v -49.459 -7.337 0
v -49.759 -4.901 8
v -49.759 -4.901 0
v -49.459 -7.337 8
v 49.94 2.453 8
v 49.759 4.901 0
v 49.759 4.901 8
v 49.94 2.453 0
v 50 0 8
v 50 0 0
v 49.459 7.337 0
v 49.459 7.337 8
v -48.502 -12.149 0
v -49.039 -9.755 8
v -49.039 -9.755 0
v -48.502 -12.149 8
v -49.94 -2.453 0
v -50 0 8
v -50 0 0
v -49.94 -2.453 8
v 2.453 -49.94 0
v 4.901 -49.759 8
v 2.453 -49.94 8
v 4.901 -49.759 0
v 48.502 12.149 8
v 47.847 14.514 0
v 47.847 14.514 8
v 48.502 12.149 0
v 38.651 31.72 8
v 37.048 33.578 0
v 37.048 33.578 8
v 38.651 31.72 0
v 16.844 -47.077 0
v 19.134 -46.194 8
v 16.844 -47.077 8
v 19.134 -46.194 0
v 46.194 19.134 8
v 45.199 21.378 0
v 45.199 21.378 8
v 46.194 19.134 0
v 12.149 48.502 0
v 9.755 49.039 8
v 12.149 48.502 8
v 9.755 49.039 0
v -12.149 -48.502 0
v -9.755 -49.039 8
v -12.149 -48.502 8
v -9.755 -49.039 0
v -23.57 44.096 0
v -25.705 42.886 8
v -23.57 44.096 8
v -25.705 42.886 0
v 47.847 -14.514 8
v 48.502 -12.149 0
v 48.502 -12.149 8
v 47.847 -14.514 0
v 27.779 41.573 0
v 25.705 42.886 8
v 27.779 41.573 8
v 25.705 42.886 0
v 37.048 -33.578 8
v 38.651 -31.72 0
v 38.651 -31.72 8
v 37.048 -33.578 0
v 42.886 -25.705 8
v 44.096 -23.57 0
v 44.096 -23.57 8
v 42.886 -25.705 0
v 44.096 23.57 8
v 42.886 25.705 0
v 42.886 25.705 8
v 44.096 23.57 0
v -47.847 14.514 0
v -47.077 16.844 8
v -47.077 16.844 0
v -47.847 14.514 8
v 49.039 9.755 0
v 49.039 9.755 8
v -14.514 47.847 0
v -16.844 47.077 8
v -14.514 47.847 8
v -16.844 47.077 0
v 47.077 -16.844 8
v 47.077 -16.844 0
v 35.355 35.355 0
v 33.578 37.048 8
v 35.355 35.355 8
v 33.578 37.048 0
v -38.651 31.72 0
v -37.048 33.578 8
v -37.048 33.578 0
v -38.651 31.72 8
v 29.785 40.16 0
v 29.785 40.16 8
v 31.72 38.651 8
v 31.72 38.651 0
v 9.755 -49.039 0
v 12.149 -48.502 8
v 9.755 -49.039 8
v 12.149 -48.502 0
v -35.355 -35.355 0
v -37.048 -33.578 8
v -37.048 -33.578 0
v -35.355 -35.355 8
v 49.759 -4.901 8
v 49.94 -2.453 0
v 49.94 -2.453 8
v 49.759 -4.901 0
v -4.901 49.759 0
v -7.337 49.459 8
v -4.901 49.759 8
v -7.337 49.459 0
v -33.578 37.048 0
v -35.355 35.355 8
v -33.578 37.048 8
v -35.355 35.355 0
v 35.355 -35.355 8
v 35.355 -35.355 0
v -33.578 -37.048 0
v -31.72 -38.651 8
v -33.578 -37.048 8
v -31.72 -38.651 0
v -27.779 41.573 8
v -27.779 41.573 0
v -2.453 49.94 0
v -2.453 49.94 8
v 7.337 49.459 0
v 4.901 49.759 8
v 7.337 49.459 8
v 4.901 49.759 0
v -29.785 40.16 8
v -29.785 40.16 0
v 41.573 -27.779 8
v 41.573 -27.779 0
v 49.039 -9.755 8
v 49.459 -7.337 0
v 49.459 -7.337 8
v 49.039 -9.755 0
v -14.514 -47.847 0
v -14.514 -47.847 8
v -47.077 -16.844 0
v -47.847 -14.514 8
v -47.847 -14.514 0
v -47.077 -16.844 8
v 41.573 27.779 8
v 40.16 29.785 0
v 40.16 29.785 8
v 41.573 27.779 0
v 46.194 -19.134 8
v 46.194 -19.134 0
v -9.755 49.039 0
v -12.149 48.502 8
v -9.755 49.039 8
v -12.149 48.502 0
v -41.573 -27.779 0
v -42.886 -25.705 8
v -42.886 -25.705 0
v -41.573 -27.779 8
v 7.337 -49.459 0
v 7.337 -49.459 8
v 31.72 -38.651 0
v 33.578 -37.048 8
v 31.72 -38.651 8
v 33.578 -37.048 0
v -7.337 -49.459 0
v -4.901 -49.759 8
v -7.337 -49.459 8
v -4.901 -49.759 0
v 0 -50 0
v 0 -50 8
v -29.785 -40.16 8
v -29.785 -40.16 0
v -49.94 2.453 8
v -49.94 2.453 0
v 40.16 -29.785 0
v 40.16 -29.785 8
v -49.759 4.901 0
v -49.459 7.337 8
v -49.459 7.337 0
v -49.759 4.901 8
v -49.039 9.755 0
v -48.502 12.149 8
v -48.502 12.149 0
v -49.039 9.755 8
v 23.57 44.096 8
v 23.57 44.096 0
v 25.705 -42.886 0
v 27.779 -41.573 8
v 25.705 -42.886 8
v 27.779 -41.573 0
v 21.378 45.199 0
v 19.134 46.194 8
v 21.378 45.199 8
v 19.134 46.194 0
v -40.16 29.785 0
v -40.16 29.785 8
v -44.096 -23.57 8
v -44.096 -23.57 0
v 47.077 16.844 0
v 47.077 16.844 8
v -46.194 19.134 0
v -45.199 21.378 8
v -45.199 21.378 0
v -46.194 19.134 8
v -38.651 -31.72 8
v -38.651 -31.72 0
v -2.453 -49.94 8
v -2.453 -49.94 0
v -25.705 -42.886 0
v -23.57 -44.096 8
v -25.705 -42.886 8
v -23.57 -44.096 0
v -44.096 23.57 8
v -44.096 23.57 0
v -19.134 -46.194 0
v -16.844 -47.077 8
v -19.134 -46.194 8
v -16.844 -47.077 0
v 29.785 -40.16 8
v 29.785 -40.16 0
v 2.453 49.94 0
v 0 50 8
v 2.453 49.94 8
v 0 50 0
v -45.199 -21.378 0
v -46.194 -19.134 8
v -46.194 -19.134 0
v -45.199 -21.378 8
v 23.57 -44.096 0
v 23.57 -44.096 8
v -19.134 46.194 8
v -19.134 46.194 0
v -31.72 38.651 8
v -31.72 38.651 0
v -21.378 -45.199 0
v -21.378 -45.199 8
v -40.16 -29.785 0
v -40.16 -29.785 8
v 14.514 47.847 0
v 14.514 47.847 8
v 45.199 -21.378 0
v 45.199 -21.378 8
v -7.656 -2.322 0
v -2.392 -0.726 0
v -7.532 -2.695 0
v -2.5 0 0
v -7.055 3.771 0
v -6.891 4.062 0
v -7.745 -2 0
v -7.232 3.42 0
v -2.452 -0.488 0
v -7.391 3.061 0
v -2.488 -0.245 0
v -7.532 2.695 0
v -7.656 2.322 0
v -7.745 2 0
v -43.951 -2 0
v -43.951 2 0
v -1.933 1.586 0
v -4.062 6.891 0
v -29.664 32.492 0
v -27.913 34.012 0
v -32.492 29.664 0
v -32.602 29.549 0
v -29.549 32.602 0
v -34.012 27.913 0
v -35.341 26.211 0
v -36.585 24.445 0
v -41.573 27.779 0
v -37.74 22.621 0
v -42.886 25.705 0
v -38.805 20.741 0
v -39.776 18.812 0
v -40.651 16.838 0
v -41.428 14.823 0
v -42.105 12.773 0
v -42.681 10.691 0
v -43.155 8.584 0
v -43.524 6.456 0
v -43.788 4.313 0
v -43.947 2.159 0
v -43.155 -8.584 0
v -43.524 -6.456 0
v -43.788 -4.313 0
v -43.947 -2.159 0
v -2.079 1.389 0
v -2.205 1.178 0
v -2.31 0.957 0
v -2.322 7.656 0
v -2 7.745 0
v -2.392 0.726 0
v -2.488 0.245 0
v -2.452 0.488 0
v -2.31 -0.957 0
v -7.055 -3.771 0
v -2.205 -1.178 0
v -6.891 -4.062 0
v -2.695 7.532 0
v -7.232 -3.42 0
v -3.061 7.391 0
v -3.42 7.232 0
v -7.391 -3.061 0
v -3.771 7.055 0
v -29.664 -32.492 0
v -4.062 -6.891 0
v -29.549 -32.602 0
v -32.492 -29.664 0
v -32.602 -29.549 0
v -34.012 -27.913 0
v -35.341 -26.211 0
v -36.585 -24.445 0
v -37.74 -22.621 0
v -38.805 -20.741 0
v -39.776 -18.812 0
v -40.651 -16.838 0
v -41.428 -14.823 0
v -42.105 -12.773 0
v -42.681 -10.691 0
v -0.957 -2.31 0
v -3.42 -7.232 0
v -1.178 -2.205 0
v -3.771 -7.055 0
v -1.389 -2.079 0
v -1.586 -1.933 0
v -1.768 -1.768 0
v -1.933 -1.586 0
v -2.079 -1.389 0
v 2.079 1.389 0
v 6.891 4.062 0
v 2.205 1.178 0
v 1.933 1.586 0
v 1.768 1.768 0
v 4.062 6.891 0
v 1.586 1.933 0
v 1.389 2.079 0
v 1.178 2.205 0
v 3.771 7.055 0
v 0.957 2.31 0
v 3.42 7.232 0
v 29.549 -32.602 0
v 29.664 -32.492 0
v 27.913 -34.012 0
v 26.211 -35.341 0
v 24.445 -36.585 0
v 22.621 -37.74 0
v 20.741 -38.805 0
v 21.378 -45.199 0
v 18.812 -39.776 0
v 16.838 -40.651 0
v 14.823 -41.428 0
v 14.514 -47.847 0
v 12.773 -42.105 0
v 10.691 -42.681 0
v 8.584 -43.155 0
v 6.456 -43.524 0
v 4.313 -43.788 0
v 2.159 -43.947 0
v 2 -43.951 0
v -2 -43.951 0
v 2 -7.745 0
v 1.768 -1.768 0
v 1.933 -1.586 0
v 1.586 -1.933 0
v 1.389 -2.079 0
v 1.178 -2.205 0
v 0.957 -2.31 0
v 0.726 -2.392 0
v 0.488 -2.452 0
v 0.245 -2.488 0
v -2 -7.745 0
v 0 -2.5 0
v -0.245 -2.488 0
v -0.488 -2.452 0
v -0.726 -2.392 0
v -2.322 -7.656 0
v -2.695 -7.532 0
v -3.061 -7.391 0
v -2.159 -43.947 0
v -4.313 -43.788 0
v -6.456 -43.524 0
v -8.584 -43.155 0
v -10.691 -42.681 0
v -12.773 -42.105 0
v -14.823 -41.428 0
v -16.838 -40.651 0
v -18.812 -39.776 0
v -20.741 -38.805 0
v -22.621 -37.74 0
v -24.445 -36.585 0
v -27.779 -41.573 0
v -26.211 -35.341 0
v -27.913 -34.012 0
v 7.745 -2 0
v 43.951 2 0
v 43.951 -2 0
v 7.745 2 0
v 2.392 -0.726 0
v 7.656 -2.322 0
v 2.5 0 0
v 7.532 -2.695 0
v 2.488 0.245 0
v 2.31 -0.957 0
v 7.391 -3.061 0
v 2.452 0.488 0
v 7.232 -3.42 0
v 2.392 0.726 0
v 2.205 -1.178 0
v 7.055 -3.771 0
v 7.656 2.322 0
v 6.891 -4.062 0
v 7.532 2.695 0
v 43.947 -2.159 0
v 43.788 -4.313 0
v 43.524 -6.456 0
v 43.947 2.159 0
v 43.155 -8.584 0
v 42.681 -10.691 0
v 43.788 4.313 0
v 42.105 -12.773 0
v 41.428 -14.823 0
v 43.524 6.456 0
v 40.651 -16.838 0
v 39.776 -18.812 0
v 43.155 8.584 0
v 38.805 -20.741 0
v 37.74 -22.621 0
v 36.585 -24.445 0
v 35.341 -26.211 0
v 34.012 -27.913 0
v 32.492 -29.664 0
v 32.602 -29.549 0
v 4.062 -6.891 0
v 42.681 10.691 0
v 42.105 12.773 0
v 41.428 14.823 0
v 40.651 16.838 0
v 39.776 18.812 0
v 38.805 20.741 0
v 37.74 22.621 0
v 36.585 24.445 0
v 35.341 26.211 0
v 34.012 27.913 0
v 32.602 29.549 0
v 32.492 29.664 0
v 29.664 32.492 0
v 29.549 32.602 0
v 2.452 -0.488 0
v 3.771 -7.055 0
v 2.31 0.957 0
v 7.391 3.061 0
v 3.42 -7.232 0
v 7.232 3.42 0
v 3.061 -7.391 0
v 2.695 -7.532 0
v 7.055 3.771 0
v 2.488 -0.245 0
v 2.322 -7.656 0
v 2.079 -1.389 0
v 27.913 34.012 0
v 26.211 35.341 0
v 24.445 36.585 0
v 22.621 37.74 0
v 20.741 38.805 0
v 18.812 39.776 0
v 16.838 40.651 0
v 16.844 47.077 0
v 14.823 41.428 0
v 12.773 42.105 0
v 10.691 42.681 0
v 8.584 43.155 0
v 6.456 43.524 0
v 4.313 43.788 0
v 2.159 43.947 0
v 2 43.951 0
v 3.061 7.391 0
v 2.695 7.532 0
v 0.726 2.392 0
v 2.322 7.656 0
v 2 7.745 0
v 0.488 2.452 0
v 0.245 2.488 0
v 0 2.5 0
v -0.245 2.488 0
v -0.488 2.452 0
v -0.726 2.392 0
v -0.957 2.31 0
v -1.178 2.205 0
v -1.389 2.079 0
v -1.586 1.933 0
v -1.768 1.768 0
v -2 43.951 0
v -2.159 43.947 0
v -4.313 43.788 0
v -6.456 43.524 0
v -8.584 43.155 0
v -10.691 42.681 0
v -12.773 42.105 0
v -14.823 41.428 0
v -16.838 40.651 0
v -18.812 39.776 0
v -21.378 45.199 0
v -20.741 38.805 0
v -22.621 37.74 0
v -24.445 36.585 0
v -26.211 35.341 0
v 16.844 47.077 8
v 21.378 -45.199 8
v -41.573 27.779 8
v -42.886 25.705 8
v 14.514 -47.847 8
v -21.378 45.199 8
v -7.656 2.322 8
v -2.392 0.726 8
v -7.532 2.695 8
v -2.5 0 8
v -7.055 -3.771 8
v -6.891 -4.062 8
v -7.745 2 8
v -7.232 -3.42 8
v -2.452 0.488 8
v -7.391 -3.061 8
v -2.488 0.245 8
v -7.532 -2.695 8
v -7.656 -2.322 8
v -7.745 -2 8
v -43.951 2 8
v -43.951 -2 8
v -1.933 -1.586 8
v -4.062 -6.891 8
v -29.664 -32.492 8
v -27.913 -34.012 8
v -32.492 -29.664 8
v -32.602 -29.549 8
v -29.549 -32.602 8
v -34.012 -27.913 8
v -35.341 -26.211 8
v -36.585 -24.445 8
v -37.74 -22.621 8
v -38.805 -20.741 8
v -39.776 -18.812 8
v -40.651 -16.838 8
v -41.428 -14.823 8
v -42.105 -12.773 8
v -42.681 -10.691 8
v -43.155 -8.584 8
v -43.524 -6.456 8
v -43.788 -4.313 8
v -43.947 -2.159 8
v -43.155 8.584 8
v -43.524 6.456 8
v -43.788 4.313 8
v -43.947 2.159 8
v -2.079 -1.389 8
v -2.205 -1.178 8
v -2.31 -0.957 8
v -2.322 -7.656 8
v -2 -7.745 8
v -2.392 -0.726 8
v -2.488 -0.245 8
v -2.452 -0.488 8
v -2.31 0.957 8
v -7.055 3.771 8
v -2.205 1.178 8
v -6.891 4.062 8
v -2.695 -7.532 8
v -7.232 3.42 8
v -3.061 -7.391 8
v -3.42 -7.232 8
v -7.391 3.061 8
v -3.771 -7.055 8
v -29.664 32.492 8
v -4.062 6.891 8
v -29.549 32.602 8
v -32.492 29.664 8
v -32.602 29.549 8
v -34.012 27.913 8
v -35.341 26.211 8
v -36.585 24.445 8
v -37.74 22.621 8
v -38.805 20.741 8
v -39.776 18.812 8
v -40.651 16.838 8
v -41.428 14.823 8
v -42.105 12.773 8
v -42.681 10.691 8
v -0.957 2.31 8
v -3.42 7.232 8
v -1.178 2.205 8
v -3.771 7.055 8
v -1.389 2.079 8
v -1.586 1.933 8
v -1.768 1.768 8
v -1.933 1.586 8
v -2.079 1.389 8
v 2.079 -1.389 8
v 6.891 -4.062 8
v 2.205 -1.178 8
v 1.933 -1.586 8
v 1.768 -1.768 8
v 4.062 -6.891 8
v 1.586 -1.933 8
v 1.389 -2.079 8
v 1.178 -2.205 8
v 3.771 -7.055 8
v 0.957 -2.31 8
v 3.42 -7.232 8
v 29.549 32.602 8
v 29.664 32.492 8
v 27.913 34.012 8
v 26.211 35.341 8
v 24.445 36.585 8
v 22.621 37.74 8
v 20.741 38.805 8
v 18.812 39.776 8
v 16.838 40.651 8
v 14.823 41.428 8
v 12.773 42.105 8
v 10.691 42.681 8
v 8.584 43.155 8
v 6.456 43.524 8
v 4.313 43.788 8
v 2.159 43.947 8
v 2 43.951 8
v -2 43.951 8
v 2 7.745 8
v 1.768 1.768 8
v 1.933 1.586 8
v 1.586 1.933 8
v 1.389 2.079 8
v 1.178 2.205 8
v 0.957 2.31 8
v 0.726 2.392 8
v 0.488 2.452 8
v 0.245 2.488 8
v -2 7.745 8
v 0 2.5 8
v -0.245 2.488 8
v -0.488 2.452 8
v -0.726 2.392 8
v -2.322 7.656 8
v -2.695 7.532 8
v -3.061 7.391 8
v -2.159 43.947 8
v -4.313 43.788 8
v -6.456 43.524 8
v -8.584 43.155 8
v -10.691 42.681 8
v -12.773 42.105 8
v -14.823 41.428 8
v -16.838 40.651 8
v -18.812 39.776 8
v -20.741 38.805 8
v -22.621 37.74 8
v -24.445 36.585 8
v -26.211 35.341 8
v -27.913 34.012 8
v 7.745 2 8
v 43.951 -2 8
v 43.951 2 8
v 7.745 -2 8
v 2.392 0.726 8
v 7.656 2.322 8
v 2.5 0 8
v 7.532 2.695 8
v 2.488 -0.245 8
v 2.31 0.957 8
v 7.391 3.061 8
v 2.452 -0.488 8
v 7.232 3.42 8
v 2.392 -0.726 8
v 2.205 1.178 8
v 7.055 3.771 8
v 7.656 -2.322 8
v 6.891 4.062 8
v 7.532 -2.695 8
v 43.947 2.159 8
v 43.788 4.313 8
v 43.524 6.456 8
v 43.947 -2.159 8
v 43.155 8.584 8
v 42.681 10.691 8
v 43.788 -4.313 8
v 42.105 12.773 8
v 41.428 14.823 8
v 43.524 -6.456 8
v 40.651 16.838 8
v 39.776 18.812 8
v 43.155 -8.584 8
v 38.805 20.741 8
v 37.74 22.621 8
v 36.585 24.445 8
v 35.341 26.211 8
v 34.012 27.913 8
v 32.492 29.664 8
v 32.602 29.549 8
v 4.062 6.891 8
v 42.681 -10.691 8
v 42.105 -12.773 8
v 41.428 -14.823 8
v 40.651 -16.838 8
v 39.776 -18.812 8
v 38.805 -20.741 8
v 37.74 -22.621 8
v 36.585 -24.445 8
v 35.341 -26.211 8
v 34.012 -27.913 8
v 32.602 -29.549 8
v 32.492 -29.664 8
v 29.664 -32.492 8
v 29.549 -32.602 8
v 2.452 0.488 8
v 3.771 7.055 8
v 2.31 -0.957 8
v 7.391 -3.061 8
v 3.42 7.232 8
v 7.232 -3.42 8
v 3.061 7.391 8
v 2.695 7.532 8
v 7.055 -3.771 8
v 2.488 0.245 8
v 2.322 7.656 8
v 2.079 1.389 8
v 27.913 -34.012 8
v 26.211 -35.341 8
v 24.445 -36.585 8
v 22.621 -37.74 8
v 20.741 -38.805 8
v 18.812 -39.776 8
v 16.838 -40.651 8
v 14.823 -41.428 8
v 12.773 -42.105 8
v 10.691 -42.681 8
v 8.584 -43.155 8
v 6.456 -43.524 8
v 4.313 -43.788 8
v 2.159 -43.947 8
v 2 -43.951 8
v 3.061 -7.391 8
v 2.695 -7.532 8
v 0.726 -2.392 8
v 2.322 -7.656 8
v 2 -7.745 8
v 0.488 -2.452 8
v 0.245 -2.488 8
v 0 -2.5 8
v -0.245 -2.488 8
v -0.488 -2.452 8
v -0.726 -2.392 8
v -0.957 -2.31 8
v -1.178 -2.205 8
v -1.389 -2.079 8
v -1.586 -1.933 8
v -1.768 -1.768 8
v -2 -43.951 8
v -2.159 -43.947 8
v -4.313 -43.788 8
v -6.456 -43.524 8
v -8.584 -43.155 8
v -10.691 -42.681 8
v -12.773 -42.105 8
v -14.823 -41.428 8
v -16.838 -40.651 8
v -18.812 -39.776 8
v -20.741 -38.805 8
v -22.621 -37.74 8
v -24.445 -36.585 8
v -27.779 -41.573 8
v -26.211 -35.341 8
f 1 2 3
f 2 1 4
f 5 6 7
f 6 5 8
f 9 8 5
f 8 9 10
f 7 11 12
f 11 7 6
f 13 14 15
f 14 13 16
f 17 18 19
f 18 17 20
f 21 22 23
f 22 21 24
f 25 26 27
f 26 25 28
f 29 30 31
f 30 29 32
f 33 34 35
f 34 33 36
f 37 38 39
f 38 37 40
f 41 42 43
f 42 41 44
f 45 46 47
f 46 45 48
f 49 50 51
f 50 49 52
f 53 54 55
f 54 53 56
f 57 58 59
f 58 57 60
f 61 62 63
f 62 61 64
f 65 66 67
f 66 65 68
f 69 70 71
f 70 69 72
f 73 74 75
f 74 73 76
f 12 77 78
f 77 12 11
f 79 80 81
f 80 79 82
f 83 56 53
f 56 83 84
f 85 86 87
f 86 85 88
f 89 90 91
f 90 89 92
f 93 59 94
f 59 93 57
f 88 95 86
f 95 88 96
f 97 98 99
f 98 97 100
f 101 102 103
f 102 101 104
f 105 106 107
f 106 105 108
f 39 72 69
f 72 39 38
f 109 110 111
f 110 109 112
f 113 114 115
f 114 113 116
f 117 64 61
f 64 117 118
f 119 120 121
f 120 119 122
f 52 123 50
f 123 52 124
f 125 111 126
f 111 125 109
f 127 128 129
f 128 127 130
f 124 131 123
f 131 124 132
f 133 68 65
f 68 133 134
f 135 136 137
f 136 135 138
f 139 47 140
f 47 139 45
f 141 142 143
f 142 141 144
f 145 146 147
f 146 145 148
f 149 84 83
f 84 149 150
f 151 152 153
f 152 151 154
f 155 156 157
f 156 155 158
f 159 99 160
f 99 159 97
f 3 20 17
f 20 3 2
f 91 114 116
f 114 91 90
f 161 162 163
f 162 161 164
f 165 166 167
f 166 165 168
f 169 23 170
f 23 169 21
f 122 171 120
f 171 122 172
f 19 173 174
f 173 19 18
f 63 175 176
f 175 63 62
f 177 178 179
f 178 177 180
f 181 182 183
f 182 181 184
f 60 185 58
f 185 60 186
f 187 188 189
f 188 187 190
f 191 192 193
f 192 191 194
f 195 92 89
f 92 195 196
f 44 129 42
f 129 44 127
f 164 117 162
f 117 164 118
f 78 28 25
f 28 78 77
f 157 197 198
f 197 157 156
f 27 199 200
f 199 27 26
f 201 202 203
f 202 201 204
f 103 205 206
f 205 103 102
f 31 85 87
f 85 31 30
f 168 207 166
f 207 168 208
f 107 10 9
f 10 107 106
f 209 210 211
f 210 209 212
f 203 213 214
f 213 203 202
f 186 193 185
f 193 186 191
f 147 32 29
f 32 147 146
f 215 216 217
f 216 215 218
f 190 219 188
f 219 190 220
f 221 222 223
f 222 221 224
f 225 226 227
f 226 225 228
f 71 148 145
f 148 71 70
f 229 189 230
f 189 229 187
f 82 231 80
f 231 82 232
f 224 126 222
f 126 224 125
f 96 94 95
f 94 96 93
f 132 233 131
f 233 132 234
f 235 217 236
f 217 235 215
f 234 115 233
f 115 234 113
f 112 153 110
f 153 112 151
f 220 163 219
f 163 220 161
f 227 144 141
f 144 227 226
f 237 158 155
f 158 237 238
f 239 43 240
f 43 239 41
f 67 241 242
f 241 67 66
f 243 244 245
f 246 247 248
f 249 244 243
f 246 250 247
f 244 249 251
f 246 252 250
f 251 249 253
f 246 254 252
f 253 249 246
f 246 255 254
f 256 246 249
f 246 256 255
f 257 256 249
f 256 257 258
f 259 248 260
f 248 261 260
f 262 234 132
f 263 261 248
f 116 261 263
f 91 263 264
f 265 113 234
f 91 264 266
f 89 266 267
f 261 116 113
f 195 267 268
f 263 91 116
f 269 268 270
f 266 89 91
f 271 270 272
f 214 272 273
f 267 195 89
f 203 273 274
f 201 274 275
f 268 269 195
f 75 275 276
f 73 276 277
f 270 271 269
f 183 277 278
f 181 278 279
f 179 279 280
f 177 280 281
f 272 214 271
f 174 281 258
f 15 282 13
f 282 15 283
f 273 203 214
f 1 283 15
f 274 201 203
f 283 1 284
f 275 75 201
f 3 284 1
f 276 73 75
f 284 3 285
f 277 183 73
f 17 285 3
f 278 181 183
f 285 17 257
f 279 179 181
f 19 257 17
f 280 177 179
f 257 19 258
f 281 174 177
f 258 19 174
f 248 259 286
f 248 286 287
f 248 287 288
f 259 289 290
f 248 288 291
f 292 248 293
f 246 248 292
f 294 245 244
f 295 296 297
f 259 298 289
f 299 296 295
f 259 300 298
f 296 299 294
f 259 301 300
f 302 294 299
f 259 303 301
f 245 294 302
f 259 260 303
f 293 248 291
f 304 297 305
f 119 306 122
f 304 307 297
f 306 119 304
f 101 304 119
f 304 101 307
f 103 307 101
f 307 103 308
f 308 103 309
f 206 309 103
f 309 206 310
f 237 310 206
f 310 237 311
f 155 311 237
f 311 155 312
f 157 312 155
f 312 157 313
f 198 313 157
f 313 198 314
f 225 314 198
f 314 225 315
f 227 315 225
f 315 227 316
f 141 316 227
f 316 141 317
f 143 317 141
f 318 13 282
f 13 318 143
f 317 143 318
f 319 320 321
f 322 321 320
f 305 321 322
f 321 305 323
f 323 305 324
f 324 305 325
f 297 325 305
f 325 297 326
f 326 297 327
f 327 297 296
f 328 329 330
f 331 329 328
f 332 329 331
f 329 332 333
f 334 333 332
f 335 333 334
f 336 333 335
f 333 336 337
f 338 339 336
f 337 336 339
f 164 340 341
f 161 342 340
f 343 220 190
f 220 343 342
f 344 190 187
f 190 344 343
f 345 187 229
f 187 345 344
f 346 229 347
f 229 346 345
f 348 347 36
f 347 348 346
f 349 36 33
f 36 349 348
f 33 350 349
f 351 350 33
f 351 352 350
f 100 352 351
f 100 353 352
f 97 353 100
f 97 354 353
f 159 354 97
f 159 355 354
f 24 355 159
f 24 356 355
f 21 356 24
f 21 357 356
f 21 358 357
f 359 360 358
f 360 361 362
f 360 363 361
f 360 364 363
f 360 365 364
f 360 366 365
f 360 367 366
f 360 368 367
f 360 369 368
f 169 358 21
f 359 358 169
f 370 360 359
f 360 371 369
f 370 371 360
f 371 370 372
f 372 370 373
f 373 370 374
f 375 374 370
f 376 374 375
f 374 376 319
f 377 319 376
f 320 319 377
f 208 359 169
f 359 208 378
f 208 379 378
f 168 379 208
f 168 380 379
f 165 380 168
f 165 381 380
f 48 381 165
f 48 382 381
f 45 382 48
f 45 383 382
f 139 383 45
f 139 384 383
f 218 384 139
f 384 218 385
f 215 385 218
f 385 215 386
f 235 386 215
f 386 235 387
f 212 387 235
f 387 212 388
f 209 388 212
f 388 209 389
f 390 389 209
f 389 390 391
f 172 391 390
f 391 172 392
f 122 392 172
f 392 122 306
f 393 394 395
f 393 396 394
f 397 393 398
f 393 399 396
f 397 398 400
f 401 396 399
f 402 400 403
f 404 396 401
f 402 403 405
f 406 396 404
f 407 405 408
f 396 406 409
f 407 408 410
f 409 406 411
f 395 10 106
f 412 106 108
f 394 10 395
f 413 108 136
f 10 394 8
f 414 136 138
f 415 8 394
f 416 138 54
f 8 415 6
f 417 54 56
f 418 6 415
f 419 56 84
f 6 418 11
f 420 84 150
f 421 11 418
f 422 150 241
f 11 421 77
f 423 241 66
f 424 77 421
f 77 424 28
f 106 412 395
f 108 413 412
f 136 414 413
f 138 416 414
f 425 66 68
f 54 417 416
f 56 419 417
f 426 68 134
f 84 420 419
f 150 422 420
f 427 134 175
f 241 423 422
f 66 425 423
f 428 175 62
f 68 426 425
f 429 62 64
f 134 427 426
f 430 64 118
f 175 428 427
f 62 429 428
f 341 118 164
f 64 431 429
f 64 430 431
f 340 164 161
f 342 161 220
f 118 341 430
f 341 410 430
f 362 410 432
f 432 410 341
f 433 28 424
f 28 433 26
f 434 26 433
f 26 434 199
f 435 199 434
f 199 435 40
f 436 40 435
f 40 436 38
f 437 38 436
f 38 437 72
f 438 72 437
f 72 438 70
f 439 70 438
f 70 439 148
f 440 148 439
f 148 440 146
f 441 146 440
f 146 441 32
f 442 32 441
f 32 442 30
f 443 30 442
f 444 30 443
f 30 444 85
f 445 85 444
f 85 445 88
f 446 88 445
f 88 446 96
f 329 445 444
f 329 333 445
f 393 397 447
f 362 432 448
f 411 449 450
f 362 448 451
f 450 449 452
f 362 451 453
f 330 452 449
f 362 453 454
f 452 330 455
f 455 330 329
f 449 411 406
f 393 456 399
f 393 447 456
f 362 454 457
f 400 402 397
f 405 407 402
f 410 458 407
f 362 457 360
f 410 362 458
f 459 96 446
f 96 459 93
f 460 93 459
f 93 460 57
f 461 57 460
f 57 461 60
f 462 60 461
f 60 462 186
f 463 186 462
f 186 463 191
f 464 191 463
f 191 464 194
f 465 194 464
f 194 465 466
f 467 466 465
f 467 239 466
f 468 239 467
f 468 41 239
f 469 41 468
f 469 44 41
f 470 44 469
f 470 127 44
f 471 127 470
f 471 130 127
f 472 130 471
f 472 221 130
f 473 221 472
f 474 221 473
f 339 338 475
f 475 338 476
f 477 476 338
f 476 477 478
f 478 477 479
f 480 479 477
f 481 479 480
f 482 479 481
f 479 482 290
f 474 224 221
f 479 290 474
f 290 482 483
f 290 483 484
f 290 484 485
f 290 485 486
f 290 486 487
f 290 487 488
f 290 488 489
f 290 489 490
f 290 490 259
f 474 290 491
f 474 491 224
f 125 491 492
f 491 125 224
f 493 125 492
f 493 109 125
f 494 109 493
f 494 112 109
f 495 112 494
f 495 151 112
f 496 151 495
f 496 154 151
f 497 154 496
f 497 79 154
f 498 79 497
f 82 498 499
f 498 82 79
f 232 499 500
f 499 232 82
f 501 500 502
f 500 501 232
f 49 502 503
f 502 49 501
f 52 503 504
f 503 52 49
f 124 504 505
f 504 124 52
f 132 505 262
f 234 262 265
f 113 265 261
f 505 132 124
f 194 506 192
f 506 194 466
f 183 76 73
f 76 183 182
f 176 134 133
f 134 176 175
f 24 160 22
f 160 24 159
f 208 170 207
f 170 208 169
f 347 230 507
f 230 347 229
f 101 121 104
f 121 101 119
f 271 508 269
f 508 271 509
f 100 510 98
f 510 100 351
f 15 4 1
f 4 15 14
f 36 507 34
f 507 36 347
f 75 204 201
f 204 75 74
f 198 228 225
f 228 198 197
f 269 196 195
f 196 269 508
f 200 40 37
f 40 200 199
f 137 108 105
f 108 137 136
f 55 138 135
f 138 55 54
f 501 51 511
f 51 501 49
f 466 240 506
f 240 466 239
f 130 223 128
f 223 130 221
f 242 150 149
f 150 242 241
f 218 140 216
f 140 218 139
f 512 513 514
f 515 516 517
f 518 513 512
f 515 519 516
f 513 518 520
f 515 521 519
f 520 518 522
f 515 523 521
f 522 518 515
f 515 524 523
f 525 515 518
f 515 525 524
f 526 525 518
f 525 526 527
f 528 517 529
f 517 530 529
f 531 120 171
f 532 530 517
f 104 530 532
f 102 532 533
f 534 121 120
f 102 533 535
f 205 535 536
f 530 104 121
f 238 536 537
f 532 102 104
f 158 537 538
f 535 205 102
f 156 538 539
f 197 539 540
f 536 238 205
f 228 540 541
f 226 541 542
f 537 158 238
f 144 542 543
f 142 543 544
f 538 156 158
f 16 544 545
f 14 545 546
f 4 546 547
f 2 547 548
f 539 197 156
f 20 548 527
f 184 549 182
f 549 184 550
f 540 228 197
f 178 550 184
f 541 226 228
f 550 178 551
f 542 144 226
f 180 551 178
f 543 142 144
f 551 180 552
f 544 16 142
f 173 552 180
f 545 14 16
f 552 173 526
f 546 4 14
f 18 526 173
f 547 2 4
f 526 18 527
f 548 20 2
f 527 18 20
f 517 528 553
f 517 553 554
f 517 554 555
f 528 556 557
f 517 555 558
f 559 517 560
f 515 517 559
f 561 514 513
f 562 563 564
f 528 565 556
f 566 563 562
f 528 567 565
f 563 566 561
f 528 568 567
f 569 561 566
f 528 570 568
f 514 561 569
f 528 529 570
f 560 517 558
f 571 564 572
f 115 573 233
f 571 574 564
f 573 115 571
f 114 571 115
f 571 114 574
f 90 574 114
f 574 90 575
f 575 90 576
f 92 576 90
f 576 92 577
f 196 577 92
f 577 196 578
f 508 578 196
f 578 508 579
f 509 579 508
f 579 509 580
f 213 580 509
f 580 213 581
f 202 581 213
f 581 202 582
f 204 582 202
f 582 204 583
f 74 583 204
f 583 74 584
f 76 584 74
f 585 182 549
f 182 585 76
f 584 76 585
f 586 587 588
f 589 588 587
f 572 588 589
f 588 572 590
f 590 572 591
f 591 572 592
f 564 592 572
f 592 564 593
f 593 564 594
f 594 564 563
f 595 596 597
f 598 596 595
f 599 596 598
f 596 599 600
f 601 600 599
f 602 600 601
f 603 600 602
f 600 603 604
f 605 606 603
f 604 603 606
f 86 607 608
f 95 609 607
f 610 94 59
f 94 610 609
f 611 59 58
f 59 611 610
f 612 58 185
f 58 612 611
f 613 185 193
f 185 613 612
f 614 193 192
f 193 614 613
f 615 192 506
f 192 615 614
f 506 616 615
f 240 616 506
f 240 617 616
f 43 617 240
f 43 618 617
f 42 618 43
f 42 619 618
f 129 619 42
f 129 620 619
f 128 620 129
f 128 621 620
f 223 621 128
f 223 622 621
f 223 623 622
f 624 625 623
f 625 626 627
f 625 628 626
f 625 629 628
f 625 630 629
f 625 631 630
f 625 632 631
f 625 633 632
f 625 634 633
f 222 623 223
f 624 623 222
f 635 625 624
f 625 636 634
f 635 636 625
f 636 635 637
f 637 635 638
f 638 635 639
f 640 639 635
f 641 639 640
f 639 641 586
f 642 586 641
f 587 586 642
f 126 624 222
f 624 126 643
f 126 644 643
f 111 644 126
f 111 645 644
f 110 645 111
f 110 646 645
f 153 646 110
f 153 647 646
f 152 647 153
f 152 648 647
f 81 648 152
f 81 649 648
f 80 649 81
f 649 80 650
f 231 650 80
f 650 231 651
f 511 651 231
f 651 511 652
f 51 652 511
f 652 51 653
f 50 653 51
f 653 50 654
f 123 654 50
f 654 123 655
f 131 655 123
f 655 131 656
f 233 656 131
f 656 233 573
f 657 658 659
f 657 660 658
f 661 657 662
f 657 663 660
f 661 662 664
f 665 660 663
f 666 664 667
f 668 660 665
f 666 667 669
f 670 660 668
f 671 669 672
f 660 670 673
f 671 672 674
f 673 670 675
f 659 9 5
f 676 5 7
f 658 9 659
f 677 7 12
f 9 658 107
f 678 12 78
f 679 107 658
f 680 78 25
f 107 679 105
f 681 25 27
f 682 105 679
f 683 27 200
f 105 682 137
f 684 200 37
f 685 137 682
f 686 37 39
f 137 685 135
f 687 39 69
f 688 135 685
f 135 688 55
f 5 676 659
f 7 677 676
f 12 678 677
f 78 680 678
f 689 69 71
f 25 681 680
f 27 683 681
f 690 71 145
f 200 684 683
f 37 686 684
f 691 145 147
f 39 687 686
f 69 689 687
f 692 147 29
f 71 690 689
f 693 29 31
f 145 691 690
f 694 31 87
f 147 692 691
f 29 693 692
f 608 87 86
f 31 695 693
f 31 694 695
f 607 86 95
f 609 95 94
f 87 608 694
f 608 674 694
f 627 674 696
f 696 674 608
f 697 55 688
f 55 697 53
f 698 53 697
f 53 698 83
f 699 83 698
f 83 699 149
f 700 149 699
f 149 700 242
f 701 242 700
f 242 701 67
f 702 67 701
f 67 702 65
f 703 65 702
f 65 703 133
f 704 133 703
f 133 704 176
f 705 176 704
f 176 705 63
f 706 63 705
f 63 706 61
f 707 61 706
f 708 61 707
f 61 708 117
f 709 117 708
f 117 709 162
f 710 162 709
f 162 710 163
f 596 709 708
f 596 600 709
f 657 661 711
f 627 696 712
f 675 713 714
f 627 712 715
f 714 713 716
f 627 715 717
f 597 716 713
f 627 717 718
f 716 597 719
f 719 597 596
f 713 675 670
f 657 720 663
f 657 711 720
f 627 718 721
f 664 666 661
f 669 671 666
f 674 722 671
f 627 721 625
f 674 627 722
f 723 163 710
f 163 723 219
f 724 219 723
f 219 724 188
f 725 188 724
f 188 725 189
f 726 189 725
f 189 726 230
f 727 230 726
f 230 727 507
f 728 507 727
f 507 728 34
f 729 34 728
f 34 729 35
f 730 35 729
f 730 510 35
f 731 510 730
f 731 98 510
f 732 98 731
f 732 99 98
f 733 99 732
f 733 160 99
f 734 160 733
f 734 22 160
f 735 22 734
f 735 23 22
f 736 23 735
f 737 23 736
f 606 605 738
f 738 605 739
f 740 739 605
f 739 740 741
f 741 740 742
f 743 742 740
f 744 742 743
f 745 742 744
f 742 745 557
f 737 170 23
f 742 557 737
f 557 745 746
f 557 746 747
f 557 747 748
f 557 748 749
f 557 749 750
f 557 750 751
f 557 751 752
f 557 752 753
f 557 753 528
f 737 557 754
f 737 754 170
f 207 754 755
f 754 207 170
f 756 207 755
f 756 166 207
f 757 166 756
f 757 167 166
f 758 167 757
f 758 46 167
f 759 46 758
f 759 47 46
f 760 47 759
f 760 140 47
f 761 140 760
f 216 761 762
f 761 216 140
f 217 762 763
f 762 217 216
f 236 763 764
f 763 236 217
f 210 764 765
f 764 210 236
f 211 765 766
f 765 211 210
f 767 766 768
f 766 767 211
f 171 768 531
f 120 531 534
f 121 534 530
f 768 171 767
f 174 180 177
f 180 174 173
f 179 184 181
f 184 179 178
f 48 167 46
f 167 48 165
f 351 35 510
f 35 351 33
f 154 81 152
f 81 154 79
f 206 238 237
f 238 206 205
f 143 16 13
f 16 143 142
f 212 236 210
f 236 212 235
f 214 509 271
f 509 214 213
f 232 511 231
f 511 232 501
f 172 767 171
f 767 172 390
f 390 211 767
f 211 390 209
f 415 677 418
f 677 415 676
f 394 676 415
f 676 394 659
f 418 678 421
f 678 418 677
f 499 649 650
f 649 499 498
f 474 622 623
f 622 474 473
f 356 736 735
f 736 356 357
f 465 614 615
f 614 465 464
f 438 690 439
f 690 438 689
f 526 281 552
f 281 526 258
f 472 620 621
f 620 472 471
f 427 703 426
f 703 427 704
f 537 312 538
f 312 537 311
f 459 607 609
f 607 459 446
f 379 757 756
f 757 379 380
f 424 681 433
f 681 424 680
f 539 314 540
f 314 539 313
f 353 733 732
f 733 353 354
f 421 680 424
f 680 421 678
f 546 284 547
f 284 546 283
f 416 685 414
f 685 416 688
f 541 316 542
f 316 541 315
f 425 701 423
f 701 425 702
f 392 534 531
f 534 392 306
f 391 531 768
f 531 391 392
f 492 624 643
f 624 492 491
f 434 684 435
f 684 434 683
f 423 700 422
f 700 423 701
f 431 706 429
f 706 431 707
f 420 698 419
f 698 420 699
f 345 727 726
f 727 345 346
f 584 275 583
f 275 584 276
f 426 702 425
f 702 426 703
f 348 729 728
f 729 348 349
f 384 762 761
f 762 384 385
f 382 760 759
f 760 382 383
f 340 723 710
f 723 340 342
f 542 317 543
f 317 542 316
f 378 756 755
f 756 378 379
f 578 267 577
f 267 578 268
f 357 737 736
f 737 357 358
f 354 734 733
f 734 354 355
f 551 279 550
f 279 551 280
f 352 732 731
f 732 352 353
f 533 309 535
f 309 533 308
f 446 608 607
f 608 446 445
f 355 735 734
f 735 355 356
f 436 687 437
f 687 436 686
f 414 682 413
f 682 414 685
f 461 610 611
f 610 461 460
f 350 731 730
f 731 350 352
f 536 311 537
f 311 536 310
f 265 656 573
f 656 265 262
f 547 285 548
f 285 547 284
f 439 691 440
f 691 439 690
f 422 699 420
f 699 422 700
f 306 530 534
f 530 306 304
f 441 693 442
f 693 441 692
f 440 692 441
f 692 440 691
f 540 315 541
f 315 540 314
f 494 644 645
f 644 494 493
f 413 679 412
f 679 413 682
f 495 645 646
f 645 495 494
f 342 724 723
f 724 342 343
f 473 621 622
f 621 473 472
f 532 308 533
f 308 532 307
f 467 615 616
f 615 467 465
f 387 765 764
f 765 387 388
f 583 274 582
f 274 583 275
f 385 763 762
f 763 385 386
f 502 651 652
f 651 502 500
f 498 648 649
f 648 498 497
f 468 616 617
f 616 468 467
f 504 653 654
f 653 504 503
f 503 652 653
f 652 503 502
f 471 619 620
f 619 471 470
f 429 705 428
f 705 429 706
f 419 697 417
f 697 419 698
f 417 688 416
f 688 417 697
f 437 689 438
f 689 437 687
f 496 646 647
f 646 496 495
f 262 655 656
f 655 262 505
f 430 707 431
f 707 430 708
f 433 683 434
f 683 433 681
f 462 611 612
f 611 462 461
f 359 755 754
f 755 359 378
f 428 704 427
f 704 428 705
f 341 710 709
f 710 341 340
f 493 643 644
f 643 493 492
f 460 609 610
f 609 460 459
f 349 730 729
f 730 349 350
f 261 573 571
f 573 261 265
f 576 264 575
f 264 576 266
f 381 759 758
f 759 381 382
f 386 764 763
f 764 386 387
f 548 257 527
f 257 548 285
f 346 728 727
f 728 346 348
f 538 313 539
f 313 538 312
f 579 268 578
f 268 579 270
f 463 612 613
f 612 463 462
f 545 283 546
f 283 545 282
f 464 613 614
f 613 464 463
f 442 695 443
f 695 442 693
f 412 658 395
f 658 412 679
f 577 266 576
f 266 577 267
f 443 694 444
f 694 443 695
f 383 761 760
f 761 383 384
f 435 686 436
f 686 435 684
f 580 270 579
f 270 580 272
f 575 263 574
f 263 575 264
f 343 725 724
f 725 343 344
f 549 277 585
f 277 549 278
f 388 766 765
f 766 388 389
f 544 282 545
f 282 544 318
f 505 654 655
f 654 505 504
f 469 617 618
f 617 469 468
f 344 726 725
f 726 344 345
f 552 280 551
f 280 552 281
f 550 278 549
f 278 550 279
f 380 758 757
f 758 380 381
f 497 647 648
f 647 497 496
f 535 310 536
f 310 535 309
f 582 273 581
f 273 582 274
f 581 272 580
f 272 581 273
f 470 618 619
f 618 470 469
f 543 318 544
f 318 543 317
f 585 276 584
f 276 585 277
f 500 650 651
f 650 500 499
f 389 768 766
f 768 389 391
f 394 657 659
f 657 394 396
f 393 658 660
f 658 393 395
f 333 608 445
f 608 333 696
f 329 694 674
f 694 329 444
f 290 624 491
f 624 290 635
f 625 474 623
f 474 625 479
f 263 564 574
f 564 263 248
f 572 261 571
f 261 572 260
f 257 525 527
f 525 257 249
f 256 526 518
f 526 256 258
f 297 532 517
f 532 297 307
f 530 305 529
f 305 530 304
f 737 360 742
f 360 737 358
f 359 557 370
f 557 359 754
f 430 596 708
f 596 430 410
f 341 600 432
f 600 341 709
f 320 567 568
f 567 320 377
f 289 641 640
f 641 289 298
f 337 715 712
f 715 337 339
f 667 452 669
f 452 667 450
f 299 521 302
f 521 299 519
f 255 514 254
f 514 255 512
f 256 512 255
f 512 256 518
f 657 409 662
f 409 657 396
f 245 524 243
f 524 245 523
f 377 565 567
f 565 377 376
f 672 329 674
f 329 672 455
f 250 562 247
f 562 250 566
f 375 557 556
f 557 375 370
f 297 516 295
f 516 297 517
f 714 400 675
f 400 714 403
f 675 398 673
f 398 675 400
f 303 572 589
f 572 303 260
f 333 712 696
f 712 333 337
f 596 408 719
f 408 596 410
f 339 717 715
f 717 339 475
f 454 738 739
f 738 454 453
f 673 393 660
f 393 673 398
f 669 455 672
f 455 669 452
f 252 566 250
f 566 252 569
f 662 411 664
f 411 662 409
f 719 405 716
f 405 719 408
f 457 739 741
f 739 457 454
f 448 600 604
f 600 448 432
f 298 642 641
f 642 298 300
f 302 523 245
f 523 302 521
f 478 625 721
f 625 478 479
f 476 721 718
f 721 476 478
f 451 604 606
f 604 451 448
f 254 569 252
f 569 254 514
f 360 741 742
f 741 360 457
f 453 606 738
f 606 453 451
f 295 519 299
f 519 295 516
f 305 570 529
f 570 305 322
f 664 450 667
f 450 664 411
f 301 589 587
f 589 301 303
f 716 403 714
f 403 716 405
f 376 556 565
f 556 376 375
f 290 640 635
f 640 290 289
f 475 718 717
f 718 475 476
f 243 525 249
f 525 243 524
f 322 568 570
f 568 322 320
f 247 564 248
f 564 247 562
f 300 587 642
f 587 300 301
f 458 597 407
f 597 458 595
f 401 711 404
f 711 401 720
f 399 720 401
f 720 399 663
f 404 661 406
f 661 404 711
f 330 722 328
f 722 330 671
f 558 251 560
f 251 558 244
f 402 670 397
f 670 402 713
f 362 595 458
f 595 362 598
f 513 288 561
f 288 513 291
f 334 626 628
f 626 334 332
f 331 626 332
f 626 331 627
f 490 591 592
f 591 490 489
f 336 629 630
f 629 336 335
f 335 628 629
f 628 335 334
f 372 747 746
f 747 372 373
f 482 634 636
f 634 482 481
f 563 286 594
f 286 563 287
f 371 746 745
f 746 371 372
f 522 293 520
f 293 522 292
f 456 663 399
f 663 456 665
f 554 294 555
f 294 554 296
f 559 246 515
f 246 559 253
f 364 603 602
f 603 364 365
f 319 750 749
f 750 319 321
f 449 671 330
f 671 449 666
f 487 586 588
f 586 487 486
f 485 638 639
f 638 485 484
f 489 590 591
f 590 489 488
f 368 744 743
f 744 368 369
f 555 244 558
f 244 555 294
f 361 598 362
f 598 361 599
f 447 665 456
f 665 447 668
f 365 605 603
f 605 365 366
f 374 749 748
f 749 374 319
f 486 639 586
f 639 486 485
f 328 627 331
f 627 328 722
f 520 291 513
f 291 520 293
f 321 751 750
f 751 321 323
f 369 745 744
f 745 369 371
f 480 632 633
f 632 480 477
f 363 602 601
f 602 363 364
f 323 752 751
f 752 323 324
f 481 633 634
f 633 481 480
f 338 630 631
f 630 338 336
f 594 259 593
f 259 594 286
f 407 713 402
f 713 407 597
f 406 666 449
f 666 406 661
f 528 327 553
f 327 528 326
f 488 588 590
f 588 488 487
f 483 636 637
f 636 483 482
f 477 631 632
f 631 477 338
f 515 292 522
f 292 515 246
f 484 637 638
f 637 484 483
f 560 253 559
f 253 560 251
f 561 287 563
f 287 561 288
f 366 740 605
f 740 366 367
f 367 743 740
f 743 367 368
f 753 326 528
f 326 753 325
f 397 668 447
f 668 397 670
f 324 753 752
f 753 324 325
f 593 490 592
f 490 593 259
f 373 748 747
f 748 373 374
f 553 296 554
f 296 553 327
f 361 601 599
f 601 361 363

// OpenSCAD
// Spoked wheel for a small sample cart
// Print orientation: flat on the bed, centred on origin

// ---- Parameters (mm) ----
thickness      = 8;     // overall wheel thickness (Z)
rim_od         = 100;   // rim outer diameter
rim_width      = 6;     // rim radial width
hub_d          = 16;    // hub outer diameter
axle_d         = 5;     // axle hole diameter
spoke_count    = 8;     // number of spokes
spoke_width    = 4;     // spoke width
overlap        = 0.5;   // spoke overlap into hub/rim for solid union
eps            = 0.5;   // cutter extension past faces

$fn = 128;

// ---- Derived ----
rim_ir       = rim_od / 2 - rim_width;  // rim inner radius
hub_r        = hub_d / 2;
spoke_start  = hub_r - overlap;          // spoke inner end (inside hub)
spoke_end    = rim_ir + overlap;         // spoke outer end (inside rim)
spoke_len    = spoke_end - spoke_start;

difference() {
    union() {
        // Outer rim
        difference() {
            cylinder(d = rim_od, h = thickness);
            translate([0, 0, -eps])
                cylinder(r = rim_ir, h = thickness + 2 * eps);
        }

        // Hub
        cylinder(d = hub_d, h = thickness);

        // Spokes, first along +X
        for (i = [0 : spoke_count - 1])
            rotate([0, 0, i * 360 / spoke_count])
                translate([spoke_start, -spoke_width / 2, 0])
                    cube([spoke_len, spoke_width, thickness]);
    }

    // Axle hole
    translate([0, 0, -eps])
        cylinder(d = axle_d, h = thickness + 2 * eps, $fn = 64);
}
